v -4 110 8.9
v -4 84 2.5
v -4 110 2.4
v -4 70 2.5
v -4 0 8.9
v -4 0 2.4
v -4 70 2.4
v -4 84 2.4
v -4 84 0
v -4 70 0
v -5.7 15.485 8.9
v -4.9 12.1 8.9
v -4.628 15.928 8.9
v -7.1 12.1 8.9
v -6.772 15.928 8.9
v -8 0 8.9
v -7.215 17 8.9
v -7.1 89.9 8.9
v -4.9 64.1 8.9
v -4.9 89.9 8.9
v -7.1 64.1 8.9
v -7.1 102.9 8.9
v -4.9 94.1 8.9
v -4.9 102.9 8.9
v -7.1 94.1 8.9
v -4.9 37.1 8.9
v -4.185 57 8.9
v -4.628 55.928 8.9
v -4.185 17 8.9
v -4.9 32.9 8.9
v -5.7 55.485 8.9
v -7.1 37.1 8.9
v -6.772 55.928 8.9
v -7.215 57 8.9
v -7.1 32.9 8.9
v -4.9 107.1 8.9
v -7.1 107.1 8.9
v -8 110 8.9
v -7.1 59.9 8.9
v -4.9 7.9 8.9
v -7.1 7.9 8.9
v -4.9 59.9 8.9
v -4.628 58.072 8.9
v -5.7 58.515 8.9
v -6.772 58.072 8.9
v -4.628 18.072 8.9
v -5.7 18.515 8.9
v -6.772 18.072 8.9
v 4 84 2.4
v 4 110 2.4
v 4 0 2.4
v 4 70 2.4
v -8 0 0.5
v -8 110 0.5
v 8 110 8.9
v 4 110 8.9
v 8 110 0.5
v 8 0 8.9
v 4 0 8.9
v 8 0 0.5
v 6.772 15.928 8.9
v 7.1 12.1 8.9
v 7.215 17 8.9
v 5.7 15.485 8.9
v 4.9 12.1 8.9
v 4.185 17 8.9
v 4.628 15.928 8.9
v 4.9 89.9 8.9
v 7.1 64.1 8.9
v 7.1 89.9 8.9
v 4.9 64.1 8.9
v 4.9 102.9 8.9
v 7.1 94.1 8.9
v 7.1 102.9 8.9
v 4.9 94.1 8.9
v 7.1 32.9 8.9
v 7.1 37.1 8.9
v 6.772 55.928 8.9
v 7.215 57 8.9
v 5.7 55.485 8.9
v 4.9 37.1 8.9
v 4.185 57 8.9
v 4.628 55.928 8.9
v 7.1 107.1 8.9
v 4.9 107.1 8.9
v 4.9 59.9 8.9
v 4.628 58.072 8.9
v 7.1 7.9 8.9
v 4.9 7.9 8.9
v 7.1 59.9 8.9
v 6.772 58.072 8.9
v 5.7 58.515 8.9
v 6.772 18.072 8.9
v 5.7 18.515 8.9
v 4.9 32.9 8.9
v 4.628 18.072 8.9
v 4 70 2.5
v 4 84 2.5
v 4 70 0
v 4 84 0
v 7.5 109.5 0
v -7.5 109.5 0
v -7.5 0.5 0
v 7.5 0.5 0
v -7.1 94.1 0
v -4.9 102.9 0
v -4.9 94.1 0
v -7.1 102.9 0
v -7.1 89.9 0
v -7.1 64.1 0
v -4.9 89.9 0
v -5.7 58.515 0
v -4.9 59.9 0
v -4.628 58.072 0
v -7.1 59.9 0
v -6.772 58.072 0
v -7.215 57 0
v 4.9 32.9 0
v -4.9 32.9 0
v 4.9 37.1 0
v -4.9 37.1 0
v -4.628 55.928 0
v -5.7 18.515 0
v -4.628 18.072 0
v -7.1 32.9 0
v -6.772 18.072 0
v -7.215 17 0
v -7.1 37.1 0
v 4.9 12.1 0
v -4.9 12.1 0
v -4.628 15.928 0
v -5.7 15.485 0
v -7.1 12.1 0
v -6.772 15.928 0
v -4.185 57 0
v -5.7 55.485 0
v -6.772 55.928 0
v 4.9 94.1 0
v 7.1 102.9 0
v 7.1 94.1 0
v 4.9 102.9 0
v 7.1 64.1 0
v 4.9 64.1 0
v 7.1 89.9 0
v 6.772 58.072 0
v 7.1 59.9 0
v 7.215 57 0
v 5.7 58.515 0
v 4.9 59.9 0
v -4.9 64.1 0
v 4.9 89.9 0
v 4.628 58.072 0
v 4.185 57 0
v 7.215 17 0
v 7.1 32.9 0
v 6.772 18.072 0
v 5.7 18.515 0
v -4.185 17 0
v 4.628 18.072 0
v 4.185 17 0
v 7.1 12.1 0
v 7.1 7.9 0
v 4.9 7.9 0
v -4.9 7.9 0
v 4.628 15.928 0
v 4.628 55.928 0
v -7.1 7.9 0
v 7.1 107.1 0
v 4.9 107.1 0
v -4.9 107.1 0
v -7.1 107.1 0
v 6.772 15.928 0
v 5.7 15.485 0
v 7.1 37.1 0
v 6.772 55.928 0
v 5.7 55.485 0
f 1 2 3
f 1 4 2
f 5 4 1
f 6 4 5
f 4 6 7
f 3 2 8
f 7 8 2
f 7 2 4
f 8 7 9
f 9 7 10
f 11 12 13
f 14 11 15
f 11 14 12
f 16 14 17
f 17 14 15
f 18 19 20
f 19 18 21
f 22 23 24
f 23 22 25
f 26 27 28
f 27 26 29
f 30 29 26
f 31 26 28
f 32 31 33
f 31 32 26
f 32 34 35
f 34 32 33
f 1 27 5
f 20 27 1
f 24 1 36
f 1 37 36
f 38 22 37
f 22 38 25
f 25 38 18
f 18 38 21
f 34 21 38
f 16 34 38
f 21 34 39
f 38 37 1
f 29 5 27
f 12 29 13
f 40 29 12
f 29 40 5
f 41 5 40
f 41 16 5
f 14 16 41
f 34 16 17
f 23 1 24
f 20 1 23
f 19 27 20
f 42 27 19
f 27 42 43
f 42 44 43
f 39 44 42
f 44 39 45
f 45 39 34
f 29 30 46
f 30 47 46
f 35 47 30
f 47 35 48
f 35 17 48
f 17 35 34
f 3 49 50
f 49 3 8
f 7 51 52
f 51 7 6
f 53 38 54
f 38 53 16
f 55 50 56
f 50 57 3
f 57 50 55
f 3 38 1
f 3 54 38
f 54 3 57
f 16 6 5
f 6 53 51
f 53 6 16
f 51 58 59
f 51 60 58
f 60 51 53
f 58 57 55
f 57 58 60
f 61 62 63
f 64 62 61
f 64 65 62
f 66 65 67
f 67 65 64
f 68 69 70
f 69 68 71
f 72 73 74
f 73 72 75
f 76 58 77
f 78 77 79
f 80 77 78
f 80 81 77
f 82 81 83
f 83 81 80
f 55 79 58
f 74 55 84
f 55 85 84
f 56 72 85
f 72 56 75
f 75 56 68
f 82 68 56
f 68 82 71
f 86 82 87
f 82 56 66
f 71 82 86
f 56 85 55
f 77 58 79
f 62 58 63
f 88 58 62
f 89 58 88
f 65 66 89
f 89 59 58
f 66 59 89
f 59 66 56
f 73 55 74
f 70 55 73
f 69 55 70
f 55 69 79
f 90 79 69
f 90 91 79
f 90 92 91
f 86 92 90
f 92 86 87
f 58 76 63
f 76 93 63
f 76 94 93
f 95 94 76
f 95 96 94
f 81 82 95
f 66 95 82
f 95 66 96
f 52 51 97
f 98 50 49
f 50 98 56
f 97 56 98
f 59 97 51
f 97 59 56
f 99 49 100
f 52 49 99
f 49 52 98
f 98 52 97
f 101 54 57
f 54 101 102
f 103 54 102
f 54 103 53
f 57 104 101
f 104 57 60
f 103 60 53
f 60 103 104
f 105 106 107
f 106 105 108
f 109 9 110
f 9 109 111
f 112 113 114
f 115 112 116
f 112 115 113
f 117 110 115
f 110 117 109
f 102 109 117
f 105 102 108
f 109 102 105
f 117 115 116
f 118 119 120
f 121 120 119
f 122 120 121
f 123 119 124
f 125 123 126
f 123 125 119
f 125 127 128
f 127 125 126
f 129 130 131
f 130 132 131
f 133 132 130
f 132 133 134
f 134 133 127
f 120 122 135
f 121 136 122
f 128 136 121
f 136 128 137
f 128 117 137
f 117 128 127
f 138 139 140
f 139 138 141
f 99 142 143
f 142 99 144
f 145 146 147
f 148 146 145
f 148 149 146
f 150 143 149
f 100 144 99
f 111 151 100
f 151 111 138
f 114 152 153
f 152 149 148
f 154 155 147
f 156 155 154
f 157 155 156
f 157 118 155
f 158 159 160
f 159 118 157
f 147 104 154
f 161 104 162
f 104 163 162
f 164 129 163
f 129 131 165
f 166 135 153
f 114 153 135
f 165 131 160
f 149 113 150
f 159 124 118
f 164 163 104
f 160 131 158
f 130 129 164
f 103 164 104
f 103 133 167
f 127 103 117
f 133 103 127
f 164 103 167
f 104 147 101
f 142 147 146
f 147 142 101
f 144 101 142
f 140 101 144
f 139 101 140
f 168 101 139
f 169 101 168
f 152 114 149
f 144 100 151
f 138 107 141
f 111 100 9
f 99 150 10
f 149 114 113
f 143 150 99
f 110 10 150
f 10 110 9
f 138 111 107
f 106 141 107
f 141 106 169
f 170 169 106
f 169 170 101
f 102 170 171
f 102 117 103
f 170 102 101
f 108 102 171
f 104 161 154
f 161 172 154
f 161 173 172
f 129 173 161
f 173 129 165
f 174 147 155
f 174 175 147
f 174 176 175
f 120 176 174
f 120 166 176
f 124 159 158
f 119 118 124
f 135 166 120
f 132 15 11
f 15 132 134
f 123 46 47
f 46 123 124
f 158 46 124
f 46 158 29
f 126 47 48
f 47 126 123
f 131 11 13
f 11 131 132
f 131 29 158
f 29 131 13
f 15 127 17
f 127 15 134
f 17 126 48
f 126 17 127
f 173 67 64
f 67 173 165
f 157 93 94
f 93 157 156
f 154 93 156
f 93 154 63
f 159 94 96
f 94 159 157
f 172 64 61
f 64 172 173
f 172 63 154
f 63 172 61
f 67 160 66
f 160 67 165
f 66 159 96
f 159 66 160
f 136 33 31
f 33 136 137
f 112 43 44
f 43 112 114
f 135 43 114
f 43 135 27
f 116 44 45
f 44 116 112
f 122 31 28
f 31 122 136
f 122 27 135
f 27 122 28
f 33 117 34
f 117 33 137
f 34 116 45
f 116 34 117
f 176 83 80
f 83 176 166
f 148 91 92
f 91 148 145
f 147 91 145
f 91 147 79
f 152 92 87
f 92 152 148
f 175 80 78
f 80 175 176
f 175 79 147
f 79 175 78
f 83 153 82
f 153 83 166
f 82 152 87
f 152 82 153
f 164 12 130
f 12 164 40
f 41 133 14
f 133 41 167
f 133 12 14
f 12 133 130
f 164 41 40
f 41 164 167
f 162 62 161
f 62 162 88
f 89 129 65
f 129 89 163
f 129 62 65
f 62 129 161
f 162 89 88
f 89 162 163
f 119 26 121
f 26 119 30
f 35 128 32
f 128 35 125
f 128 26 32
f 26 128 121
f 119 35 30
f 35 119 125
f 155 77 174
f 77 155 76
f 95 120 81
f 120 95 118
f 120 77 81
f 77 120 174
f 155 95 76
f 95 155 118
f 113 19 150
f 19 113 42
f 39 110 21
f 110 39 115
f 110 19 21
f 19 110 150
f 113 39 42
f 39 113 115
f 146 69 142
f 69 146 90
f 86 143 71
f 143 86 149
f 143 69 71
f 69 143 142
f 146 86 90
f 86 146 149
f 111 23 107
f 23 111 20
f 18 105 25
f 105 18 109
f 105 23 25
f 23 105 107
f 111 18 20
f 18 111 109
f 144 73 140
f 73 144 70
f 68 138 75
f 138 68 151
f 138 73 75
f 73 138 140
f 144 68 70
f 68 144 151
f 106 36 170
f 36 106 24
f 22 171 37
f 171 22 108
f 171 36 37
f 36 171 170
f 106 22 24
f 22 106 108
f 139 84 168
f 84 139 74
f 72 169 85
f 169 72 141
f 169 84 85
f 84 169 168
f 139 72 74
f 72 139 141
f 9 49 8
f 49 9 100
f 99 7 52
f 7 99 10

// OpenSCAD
// =====================================================================
// child_vtray_cable_rail.scad - removable longitudinal cable restraint
//
// Two identical rails are bolted below the vertical tray through the existing
// 16 x 30 mm cable slots.  One rail is power, the other signal/sensor.  Zip
// ties pass through paired slots every <=30 mm and positively retain the cable.
// Print flat as modelled, channel facing up.  No supports are required.
// =====================================================================

include <../../../../../scad/lib/util.scad>;

/* [Rail] */
rail_w = 16.0;
rail_l = 110.0;
base_t = 2.4;                 // 6 layers at 0.2 mm plus margin
channel_w = 8.0;              // bundle OD up to about 8 mm with foam liner
wall_h = 6.5;

/* [Fasteners] */
// 2026-08-03: the old mount_y = [40, 80] put every bolt in mid-air — it landed
// inside the deck's own 16 x 30 mm cable slot, so there was nothing to clamp and
// no washer can bridge the opening. The bolts now sit on the deck's solid webs
// and self-tap into these side walls (base_t + wall_h = 8.9 mm of material).
// Keep in step with child_vtray_deck: rail_hz = mount_y + rail_z0(20), rail_hx = mount_x.
rail_z0 = 20;                 // assembly Z of this rail's local y = 0
mount_y = [17, 57];           // assembly Z = 37 / 77, both clear of every deck slot
mount_x = 5.7;                // through the side walls, not the channel floor
mount_d = 2.8;                // M3 self-tap pilot (the deck carries the Ø3.4 clearance)

/* [Drop window] */
// 2026-09-03: the deck's middle cable slit (world z 83..109, rail-local y 63..89) was
// covered by this solid base, so nothing could actually drop from the deck top into the
// trough there. A window through the channel floor (rail-local y 70..84 = world z 90..104)
// lets the MAIN-side harnesses (RX / tether / temp / leak / pressure) enter the trough.
// It sits inside the deck slit and between the tie stations.
drop_y = 77;                  // window centre (rail-local y) = world z 97
drop_l = 14;                  // window length (Y); the deck slit is 26 long

/* [Cable ties] */
// 2026-09-03: 70 -> 62 / 92, 100 -> 105 to clear the drop window (spacing still <= 30 mm)
tie_y = [10, 35, 62, 92, 105];
tie_slot_x = 2.2;             // passage for tie thickness
tie_slot_y = 4.2;             // up to 4 mm reusable/nylon tie width
tie_x = (channel_w/2 + rail_w/2)/2;

/* [Print] */
bottom_chamfer = 0.5;
$fa = 4;
$fs = 0.3;

assert(rail_w-channel_w >= 2*3.5, "Cable rail side walls are too thin");
assert(max(tie_y[1]-tie_y[0], tie_y[2]-tie_y[1], tie_y[3]-tie_y[2], tie_y[4]-tie_y[3]) <= 30,
       "Cable restraint spacing exceeds 30 mm");
// drop window must stay inside the deck slit (rail-local y 63..89) and clear ties / bolts
assert(drop_y - drop_l/2 >= 63 && drop_y + drop_l/2 <= 89, "drop window is outside the deck slit");
for (y = tie_y) assert(abs(y - drop_y) >= drop_l/2 + tie_slot_y/2 + 1, str("tie slot y=", y, " runs into the drop window"));
for (y = mount_y) assert(abs(y - drop_y) >= drop_l/2 + mount_d/2 + 1, str("mount hole y=", y, " runs into the drop window"));
assert(mount_x + mount_d/2 < rail_w/2-0.3, "M3 hole breaks the outer wall");
// The bolt must go through a side wall, never through the open channel floor,
// or there is only base_t (2.4 mm) of thread engagement.
assert(mount_x - mount_d/2 > channel_w/2,
       "M3 pilot falls into the cable channel - no thread engagement");
for (y = mount_y) assert(y > mount_d && y < rail_l - mount_d,
                         "mount hole runs off the end of the rail");

module chamfered_base() {
    hull() {
        translate([-rail_w/2+bottom_chamfer, bottom_chamfer, 0])
            cube([rail_w-2*bottom_chamfer, rail_l-2*bottom_chamfer, 0.01]);
        translate([-rail_w/2, 0, bottom_chamfer])
            cube([rail_w, rail_l, base_t-bottom_chamfer]);
    }
}

difference() {
    union() {
        chamfered_base();
        for (sx=[-1,1])
            translate([sx>0 ? channel_w/2 : -rail_w/2, 0, base_t])
                cube([(rail_w-channel_w)/2, rail_l, wall_h]);
    }

    // Two M3 bolts per station, driven from the deck's top face into these walls.
    for (y=mount_y, sx=[-1,1])
        translate([sx*mount_x, y, -0.1]) hole(mount_d, base_t+wall_h+0.2, fn=8);

    // Drop window through the channel floor (cables come down from the deck slit here)
    translate([-channel_w/2, drop_y - drop_l/2, -0.1]) cube([channel_w, drop_l, base_t + 0.2]);

    // Paired passages let a tie wrap completely around the bundle and rail.
    for (y=tie_y, sx=[-1,1])
        translate([sx*tie_x-tie_slot_x/2, y-tie_slot_y/2, -0.1])
            cube([tie_slot_x, tie_slot_y, base_t+wall_h+0.2]);
}

echo(str("child_vtray_cable_rail: ",rail_w," x ",rail_l,
         " / channel ",channel_w," / tie spacing <=30 mm"));
